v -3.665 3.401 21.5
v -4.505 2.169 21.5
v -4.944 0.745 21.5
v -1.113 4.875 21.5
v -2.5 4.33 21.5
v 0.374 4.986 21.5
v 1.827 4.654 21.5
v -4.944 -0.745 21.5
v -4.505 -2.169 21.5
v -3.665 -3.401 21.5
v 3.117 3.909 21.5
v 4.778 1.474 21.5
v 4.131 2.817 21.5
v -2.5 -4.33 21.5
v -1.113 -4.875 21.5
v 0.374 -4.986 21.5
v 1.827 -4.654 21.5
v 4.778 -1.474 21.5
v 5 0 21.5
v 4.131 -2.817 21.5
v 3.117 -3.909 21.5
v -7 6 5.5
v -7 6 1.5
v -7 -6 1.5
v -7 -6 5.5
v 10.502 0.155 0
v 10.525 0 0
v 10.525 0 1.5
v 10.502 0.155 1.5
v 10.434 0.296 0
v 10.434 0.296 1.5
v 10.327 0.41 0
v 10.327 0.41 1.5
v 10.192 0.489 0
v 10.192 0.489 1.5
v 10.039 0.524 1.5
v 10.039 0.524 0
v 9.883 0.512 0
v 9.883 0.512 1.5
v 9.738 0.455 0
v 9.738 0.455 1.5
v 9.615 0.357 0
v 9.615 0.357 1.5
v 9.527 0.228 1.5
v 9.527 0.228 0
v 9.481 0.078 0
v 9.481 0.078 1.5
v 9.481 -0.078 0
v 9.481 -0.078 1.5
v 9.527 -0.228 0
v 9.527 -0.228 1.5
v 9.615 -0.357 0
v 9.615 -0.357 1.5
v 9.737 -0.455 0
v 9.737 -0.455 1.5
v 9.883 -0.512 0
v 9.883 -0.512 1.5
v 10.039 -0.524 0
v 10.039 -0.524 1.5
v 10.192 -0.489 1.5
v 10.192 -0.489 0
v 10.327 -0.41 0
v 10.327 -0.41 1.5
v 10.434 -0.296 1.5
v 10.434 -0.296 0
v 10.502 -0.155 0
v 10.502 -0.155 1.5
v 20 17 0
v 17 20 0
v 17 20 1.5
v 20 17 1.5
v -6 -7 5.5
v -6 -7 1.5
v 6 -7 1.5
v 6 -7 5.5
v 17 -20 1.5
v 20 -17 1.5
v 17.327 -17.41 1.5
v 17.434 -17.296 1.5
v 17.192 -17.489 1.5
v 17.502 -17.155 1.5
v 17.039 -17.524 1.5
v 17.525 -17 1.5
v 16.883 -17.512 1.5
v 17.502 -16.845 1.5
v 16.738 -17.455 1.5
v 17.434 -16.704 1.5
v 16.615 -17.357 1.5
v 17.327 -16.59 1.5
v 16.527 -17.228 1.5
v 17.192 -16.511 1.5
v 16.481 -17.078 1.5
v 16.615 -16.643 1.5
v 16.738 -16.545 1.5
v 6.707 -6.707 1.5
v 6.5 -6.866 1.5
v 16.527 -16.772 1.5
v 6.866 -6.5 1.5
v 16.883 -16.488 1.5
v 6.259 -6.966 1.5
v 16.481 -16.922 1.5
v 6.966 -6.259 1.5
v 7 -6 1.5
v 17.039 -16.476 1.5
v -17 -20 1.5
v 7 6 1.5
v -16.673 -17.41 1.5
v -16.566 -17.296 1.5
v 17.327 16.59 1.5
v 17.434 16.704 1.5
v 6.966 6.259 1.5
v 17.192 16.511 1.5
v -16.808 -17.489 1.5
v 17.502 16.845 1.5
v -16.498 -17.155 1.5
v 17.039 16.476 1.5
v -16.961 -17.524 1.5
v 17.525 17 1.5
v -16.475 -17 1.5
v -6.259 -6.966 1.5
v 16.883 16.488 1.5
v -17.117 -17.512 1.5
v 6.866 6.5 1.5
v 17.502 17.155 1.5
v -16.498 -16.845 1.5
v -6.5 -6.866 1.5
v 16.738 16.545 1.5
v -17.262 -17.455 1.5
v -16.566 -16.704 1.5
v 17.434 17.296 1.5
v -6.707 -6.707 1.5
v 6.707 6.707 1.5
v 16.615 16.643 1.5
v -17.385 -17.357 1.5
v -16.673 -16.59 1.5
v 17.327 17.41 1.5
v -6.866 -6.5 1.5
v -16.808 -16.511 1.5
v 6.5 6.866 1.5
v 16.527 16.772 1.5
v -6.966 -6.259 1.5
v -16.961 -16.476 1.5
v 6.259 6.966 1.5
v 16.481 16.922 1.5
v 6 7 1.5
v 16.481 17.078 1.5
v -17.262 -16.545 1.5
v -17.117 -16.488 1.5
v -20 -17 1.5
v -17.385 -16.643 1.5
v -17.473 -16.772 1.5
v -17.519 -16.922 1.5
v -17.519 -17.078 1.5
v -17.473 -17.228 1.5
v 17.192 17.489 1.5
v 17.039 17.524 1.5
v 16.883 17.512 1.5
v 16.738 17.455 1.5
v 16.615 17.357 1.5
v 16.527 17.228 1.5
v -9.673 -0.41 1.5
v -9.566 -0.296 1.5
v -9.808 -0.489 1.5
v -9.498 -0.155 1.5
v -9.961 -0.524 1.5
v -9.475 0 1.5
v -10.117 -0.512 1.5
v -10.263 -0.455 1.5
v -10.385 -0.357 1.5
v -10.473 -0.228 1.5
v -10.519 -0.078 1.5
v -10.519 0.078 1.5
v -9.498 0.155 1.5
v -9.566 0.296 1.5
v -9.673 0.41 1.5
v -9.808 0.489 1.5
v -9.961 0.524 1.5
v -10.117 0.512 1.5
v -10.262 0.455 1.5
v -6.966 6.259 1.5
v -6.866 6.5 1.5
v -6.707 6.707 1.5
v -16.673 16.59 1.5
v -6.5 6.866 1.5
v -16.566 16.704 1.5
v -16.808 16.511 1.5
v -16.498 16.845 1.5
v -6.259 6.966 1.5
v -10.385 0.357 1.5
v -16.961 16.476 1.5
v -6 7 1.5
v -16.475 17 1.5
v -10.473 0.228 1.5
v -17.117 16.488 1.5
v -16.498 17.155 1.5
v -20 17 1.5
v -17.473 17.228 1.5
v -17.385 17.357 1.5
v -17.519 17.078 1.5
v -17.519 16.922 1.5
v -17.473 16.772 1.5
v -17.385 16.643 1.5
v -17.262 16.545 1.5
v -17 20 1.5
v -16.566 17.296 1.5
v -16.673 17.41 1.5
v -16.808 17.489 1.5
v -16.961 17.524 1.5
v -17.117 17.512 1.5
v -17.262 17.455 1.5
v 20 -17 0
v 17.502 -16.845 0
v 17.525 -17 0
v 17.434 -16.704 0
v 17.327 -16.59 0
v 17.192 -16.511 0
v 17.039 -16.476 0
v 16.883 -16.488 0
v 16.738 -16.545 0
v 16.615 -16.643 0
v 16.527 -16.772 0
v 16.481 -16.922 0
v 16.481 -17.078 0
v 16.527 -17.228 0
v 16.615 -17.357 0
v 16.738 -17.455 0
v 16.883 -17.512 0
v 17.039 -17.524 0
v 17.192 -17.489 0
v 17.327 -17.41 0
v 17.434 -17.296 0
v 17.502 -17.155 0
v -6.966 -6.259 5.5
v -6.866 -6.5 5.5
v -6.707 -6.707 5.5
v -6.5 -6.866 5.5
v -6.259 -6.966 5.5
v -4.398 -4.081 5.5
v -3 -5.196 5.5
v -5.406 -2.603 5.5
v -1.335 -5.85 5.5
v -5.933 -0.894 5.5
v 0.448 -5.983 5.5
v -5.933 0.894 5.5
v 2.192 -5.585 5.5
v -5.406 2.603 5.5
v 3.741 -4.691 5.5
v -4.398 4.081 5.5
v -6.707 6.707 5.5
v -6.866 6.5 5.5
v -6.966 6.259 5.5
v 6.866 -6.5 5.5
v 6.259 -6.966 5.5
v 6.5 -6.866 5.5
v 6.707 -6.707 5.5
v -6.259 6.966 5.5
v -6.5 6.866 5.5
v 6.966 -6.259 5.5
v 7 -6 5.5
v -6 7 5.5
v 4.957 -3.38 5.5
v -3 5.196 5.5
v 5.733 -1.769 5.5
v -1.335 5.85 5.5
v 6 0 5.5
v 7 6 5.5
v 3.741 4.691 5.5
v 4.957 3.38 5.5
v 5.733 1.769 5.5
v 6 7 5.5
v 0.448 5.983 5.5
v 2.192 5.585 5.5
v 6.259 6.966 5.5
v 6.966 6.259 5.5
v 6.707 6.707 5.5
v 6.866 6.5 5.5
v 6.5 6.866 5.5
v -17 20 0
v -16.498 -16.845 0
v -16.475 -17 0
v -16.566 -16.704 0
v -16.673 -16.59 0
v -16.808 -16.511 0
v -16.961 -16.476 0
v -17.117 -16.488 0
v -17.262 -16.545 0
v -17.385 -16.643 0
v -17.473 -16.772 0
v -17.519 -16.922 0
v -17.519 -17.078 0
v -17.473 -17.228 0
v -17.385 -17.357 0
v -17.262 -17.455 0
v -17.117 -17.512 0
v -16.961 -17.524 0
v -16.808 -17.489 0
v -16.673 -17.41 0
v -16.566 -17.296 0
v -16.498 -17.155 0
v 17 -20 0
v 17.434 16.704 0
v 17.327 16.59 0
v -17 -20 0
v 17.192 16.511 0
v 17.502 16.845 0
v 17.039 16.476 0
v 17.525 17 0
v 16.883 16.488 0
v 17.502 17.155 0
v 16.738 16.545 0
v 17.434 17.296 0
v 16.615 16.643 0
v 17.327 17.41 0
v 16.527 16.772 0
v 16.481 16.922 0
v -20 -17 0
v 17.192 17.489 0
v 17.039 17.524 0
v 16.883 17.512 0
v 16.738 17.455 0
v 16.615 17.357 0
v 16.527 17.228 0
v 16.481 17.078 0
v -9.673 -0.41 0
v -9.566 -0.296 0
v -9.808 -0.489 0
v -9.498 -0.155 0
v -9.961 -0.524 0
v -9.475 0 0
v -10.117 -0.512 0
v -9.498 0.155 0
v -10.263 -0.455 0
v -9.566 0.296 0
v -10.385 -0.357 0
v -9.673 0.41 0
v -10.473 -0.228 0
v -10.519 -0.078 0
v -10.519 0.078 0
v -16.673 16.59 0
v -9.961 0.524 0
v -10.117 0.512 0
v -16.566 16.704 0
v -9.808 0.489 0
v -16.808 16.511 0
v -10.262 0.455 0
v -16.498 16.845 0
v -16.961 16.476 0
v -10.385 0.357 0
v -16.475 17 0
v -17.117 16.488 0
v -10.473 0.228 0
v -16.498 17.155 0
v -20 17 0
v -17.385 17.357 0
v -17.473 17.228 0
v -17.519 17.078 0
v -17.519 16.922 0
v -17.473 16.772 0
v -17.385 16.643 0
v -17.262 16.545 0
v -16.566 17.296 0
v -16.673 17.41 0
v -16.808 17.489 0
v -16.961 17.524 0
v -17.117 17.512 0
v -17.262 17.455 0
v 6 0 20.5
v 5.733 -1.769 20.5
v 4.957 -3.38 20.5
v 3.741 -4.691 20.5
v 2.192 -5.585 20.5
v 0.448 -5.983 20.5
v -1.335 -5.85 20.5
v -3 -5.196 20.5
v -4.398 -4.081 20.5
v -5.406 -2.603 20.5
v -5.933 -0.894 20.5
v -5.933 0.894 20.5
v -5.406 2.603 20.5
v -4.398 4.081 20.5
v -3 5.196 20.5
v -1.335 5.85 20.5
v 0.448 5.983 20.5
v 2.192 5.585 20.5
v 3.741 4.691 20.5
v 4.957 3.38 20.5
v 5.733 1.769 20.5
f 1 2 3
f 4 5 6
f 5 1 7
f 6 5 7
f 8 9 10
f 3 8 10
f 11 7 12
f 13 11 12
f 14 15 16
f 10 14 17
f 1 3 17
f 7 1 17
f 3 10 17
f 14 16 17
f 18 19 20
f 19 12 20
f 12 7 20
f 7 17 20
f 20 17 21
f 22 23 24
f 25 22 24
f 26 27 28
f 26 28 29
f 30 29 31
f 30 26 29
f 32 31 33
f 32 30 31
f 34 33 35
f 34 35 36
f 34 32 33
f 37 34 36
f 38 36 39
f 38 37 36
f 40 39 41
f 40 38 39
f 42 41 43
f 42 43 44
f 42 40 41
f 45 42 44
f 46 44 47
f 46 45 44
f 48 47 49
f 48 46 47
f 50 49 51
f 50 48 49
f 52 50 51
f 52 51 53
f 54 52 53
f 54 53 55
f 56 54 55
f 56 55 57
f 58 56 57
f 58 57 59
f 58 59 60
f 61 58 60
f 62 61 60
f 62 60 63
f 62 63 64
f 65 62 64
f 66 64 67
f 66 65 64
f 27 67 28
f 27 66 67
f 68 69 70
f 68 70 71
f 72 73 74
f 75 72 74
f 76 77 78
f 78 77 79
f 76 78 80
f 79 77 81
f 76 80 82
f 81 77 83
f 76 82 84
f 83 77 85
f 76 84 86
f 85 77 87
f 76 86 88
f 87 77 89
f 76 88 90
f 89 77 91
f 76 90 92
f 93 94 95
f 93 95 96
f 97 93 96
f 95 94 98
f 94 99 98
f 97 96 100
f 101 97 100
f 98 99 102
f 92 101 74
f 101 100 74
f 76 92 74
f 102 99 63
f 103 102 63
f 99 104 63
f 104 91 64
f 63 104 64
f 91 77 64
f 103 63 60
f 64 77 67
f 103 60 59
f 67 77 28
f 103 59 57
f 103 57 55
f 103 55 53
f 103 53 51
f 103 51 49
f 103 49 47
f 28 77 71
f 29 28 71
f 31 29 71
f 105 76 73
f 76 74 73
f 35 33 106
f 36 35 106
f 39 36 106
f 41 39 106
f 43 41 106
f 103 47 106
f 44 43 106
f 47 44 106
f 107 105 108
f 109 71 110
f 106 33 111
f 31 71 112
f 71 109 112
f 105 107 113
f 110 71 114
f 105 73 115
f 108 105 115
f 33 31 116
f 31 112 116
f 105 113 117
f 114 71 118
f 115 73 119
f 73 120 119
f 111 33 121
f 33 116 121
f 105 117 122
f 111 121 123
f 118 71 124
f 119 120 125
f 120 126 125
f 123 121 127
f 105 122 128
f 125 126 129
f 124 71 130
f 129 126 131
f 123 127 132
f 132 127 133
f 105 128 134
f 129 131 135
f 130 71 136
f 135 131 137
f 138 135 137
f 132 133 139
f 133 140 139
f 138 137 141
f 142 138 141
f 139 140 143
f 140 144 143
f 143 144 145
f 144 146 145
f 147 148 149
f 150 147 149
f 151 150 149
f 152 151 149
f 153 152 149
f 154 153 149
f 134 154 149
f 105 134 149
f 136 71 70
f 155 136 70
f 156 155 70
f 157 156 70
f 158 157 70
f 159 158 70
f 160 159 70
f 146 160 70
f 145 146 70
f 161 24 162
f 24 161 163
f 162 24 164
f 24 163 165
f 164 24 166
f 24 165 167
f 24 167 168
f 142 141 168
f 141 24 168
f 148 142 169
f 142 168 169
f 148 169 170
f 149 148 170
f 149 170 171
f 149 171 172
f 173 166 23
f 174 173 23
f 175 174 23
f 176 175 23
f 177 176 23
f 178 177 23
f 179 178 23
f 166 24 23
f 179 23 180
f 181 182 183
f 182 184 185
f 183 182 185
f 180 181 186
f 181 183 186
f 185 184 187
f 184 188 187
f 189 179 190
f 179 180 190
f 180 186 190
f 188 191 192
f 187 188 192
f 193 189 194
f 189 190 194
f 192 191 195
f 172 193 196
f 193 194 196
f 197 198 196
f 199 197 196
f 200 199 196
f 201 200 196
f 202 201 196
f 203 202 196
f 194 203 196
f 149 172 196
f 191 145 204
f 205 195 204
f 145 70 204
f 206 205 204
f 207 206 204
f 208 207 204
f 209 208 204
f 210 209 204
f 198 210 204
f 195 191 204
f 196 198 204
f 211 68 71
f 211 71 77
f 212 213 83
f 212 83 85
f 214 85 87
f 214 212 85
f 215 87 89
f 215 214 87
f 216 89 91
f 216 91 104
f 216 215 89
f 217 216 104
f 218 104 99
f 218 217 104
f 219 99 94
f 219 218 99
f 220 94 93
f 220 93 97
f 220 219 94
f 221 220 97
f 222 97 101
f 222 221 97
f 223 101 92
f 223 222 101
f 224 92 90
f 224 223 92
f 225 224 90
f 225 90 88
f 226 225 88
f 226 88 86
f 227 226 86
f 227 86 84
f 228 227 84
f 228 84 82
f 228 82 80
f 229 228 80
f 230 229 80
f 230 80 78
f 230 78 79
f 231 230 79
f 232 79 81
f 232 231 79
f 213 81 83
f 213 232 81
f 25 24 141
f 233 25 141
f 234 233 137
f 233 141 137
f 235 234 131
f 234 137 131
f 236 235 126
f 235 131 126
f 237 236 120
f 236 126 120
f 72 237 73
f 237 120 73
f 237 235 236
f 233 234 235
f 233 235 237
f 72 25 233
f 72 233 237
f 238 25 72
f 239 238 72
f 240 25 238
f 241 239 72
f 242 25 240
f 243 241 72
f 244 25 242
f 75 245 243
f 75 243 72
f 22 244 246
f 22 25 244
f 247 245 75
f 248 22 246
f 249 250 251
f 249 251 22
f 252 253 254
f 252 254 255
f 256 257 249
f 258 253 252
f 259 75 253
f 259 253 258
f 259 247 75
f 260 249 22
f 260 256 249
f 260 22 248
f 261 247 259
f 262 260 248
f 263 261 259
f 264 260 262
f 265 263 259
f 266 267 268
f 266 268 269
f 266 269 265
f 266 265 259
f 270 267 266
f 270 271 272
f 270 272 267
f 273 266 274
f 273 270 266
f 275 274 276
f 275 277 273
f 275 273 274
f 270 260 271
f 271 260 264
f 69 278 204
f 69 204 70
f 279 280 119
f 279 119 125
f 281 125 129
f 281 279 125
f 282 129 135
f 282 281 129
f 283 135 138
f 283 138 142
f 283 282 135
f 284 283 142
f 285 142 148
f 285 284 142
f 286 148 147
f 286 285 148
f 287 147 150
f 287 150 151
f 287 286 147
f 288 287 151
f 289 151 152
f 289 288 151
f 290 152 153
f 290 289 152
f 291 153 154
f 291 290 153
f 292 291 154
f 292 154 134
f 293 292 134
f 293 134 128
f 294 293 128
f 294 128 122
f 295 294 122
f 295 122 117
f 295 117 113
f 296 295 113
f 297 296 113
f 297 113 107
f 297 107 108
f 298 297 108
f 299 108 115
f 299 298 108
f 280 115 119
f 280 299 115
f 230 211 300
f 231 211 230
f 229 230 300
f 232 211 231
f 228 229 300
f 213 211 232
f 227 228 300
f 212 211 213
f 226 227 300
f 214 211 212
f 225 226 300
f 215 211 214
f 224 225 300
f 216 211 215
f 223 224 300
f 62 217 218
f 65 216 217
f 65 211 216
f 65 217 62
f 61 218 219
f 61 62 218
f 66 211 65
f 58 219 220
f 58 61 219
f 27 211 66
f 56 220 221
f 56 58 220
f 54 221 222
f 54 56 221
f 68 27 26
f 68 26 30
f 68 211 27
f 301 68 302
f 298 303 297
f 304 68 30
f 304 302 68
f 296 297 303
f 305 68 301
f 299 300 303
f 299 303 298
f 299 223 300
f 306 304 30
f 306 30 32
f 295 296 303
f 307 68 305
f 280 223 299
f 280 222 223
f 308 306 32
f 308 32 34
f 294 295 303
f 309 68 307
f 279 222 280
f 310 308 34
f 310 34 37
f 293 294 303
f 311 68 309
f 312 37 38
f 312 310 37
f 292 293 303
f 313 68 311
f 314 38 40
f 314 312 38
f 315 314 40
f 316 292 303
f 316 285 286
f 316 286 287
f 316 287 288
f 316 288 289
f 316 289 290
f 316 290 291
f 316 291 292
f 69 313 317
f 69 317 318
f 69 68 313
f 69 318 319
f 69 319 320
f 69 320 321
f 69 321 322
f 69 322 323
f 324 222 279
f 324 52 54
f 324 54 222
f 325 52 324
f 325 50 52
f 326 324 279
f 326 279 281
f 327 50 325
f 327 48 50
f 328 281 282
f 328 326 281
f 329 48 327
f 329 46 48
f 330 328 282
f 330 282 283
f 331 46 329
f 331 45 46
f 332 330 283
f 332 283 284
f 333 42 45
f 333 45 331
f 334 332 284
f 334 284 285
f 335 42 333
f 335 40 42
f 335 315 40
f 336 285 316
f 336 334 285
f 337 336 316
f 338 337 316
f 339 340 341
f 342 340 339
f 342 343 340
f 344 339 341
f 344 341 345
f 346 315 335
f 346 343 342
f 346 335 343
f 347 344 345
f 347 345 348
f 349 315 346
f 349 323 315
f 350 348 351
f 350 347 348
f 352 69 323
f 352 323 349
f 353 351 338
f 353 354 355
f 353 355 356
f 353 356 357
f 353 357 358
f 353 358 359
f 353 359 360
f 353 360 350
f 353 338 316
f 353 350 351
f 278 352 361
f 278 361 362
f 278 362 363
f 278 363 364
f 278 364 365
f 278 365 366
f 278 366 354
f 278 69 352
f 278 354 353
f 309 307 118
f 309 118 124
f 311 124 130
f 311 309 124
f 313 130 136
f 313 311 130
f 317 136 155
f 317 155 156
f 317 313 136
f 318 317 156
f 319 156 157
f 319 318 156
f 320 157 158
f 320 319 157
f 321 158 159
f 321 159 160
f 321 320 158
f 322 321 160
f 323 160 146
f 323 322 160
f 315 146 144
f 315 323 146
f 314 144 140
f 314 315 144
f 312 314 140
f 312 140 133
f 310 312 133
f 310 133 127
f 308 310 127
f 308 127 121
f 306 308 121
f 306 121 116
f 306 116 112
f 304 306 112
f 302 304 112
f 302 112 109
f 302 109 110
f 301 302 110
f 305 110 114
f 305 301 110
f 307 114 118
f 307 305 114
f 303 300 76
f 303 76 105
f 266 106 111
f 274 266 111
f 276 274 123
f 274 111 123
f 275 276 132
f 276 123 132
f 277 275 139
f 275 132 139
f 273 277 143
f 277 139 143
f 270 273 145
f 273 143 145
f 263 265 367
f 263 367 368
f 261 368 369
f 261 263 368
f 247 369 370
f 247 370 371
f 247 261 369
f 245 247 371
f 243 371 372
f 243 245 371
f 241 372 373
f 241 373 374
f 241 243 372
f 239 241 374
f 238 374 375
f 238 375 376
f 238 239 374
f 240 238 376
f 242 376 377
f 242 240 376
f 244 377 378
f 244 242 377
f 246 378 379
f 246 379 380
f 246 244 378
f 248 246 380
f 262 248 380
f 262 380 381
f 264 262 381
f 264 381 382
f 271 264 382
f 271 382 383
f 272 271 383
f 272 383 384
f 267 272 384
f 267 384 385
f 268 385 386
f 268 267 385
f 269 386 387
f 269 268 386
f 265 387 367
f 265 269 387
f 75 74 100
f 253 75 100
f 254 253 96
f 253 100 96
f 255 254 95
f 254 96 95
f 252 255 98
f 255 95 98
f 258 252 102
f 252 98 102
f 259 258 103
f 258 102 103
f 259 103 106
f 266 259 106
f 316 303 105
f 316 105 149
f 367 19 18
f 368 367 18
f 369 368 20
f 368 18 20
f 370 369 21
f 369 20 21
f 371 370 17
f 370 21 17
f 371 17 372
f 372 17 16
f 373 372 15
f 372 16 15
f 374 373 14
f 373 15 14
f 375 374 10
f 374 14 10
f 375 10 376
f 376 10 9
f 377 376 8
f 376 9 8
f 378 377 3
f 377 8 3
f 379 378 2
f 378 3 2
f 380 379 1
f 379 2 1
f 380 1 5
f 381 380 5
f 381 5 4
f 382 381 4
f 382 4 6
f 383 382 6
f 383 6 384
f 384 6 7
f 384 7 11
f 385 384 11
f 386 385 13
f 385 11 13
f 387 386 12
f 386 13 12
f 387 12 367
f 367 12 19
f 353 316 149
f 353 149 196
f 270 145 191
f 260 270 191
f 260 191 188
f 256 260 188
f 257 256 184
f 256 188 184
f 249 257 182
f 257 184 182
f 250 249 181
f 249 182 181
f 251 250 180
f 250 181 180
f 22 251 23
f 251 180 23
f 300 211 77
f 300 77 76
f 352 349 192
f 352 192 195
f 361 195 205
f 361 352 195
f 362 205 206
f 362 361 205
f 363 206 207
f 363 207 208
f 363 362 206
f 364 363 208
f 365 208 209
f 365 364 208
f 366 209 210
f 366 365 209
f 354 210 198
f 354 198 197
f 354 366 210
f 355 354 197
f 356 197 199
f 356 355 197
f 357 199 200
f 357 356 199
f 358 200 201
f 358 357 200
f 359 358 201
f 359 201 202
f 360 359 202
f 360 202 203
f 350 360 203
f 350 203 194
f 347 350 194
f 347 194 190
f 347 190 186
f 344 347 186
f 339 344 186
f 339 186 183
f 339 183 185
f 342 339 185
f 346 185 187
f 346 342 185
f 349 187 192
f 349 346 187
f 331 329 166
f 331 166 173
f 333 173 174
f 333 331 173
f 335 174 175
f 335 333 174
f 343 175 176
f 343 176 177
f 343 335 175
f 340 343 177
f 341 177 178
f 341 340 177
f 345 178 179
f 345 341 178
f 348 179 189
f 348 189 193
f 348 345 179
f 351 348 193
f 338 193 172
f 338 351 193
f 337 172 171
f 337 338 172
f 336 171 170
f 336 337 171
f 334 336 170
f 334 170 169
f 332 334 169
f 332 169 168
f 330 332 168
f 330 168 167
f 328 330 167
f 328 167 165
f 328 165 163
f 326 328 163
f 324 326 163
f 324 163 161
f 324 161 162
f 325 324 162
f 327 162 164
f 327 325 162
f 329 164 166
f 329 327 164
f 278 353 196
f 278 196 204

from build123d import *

# Parameters (mm, degrees)
SKETCH1_R           = 0.525
BOSS_EXTRUDE1_DEPTH = 1.5
BOSS_EXTRUDE2_DEPTH = 4
SKETCH4_W           = 6
SKETCH4_H           = 16
CHAMFER1_SIZE       = 1


with BuildPart() as part:
    # Sketch1 → Boss-Extrude1 (new body)
    with BuildSketch(Plane.XY):
        Polygon((-20, 17), (-17, 20), (17, 20), (20, 17), (20, -17), (17, -20), (-17, -20), (-20, -17), align=None)
        with Locations((-17, 17)):
            Circle(SKETCH1_R, mode=Mode.SUBTRACT)
        with Locations((17, 17)):
            Circle(SKETCH1_R, mode=Mode.SUBTRACT)
        with Locations((17, -17)):
            Circle(SKETCH1_R, mode=Mode.SUBTRACT)
        with Locations((-17, -17)):
            Circle(SKETCH1_R, mode=Mode.SUBTRACT)
        with Locations((10, 0)):
            Circle(SKETCH1_R, mode=Mode.SUBTRACT)
        with Locations((-10, 0)):
            Circle(SKETCH1_R, mode=Mode.SUBTRACT)
    extrude(amount=BOSS_EXTRUDE1_DEPTH)

    # Sketch3 → Boss-Extrude2 (add)
    with BuildSketch(Plane.XY.offset(1.5)):
        with BuildLine():
            Line((-6, -7), (6, -7))
            ThreePointArc((6, -7), (6.707106781, -6.707106781), (7, -6))
            Line((7, -6), (7, 6))
            ThreePointArc((7, 6), (6.707106781, 6.707106781), (6, 7))
            Line((6, 7), (-6, 7))
            ThreePointArc((-6, 7), (-6.707106781, 6.707106781), (-7, 6))
            Line((-7, 6), (-7, -6))
            ThreePointArc((-7, -6), (-6.707106781, -6.707106781), (-6, -7))
        make_face()
    extrude(amount=BOSS_EXTRUDE2_DEPTH)

    # Sketch4 → Revolve1 (revolve)
    with BuildSketch(Plane(origin=(0, 0, 0), x_dir=(1, 0, 0), z_dir=(0, 1, 0)), mode=Mode.PRIVATE) as revolve1_sk:
        with Locations((-3, -13.5)):
            Rectangle(SKETCH4_W, SKETCH4_H)
    revolve(revolve1_sk.sketch.rotate(Axis((0, 0, 1000), (0, 0, -1)), 180), axis=Axis((0, 0, 1000), (0, 0, -1)))

    # Chamfer1
    chamfer1_edges = [part.edges().sort_by_distance(p)[0] for p in [
        (-6, 0, 21.5),
    ]]
    chamfer(chamfer1_edges, length=CHAMFER1_SIZE)


solid = part.part
